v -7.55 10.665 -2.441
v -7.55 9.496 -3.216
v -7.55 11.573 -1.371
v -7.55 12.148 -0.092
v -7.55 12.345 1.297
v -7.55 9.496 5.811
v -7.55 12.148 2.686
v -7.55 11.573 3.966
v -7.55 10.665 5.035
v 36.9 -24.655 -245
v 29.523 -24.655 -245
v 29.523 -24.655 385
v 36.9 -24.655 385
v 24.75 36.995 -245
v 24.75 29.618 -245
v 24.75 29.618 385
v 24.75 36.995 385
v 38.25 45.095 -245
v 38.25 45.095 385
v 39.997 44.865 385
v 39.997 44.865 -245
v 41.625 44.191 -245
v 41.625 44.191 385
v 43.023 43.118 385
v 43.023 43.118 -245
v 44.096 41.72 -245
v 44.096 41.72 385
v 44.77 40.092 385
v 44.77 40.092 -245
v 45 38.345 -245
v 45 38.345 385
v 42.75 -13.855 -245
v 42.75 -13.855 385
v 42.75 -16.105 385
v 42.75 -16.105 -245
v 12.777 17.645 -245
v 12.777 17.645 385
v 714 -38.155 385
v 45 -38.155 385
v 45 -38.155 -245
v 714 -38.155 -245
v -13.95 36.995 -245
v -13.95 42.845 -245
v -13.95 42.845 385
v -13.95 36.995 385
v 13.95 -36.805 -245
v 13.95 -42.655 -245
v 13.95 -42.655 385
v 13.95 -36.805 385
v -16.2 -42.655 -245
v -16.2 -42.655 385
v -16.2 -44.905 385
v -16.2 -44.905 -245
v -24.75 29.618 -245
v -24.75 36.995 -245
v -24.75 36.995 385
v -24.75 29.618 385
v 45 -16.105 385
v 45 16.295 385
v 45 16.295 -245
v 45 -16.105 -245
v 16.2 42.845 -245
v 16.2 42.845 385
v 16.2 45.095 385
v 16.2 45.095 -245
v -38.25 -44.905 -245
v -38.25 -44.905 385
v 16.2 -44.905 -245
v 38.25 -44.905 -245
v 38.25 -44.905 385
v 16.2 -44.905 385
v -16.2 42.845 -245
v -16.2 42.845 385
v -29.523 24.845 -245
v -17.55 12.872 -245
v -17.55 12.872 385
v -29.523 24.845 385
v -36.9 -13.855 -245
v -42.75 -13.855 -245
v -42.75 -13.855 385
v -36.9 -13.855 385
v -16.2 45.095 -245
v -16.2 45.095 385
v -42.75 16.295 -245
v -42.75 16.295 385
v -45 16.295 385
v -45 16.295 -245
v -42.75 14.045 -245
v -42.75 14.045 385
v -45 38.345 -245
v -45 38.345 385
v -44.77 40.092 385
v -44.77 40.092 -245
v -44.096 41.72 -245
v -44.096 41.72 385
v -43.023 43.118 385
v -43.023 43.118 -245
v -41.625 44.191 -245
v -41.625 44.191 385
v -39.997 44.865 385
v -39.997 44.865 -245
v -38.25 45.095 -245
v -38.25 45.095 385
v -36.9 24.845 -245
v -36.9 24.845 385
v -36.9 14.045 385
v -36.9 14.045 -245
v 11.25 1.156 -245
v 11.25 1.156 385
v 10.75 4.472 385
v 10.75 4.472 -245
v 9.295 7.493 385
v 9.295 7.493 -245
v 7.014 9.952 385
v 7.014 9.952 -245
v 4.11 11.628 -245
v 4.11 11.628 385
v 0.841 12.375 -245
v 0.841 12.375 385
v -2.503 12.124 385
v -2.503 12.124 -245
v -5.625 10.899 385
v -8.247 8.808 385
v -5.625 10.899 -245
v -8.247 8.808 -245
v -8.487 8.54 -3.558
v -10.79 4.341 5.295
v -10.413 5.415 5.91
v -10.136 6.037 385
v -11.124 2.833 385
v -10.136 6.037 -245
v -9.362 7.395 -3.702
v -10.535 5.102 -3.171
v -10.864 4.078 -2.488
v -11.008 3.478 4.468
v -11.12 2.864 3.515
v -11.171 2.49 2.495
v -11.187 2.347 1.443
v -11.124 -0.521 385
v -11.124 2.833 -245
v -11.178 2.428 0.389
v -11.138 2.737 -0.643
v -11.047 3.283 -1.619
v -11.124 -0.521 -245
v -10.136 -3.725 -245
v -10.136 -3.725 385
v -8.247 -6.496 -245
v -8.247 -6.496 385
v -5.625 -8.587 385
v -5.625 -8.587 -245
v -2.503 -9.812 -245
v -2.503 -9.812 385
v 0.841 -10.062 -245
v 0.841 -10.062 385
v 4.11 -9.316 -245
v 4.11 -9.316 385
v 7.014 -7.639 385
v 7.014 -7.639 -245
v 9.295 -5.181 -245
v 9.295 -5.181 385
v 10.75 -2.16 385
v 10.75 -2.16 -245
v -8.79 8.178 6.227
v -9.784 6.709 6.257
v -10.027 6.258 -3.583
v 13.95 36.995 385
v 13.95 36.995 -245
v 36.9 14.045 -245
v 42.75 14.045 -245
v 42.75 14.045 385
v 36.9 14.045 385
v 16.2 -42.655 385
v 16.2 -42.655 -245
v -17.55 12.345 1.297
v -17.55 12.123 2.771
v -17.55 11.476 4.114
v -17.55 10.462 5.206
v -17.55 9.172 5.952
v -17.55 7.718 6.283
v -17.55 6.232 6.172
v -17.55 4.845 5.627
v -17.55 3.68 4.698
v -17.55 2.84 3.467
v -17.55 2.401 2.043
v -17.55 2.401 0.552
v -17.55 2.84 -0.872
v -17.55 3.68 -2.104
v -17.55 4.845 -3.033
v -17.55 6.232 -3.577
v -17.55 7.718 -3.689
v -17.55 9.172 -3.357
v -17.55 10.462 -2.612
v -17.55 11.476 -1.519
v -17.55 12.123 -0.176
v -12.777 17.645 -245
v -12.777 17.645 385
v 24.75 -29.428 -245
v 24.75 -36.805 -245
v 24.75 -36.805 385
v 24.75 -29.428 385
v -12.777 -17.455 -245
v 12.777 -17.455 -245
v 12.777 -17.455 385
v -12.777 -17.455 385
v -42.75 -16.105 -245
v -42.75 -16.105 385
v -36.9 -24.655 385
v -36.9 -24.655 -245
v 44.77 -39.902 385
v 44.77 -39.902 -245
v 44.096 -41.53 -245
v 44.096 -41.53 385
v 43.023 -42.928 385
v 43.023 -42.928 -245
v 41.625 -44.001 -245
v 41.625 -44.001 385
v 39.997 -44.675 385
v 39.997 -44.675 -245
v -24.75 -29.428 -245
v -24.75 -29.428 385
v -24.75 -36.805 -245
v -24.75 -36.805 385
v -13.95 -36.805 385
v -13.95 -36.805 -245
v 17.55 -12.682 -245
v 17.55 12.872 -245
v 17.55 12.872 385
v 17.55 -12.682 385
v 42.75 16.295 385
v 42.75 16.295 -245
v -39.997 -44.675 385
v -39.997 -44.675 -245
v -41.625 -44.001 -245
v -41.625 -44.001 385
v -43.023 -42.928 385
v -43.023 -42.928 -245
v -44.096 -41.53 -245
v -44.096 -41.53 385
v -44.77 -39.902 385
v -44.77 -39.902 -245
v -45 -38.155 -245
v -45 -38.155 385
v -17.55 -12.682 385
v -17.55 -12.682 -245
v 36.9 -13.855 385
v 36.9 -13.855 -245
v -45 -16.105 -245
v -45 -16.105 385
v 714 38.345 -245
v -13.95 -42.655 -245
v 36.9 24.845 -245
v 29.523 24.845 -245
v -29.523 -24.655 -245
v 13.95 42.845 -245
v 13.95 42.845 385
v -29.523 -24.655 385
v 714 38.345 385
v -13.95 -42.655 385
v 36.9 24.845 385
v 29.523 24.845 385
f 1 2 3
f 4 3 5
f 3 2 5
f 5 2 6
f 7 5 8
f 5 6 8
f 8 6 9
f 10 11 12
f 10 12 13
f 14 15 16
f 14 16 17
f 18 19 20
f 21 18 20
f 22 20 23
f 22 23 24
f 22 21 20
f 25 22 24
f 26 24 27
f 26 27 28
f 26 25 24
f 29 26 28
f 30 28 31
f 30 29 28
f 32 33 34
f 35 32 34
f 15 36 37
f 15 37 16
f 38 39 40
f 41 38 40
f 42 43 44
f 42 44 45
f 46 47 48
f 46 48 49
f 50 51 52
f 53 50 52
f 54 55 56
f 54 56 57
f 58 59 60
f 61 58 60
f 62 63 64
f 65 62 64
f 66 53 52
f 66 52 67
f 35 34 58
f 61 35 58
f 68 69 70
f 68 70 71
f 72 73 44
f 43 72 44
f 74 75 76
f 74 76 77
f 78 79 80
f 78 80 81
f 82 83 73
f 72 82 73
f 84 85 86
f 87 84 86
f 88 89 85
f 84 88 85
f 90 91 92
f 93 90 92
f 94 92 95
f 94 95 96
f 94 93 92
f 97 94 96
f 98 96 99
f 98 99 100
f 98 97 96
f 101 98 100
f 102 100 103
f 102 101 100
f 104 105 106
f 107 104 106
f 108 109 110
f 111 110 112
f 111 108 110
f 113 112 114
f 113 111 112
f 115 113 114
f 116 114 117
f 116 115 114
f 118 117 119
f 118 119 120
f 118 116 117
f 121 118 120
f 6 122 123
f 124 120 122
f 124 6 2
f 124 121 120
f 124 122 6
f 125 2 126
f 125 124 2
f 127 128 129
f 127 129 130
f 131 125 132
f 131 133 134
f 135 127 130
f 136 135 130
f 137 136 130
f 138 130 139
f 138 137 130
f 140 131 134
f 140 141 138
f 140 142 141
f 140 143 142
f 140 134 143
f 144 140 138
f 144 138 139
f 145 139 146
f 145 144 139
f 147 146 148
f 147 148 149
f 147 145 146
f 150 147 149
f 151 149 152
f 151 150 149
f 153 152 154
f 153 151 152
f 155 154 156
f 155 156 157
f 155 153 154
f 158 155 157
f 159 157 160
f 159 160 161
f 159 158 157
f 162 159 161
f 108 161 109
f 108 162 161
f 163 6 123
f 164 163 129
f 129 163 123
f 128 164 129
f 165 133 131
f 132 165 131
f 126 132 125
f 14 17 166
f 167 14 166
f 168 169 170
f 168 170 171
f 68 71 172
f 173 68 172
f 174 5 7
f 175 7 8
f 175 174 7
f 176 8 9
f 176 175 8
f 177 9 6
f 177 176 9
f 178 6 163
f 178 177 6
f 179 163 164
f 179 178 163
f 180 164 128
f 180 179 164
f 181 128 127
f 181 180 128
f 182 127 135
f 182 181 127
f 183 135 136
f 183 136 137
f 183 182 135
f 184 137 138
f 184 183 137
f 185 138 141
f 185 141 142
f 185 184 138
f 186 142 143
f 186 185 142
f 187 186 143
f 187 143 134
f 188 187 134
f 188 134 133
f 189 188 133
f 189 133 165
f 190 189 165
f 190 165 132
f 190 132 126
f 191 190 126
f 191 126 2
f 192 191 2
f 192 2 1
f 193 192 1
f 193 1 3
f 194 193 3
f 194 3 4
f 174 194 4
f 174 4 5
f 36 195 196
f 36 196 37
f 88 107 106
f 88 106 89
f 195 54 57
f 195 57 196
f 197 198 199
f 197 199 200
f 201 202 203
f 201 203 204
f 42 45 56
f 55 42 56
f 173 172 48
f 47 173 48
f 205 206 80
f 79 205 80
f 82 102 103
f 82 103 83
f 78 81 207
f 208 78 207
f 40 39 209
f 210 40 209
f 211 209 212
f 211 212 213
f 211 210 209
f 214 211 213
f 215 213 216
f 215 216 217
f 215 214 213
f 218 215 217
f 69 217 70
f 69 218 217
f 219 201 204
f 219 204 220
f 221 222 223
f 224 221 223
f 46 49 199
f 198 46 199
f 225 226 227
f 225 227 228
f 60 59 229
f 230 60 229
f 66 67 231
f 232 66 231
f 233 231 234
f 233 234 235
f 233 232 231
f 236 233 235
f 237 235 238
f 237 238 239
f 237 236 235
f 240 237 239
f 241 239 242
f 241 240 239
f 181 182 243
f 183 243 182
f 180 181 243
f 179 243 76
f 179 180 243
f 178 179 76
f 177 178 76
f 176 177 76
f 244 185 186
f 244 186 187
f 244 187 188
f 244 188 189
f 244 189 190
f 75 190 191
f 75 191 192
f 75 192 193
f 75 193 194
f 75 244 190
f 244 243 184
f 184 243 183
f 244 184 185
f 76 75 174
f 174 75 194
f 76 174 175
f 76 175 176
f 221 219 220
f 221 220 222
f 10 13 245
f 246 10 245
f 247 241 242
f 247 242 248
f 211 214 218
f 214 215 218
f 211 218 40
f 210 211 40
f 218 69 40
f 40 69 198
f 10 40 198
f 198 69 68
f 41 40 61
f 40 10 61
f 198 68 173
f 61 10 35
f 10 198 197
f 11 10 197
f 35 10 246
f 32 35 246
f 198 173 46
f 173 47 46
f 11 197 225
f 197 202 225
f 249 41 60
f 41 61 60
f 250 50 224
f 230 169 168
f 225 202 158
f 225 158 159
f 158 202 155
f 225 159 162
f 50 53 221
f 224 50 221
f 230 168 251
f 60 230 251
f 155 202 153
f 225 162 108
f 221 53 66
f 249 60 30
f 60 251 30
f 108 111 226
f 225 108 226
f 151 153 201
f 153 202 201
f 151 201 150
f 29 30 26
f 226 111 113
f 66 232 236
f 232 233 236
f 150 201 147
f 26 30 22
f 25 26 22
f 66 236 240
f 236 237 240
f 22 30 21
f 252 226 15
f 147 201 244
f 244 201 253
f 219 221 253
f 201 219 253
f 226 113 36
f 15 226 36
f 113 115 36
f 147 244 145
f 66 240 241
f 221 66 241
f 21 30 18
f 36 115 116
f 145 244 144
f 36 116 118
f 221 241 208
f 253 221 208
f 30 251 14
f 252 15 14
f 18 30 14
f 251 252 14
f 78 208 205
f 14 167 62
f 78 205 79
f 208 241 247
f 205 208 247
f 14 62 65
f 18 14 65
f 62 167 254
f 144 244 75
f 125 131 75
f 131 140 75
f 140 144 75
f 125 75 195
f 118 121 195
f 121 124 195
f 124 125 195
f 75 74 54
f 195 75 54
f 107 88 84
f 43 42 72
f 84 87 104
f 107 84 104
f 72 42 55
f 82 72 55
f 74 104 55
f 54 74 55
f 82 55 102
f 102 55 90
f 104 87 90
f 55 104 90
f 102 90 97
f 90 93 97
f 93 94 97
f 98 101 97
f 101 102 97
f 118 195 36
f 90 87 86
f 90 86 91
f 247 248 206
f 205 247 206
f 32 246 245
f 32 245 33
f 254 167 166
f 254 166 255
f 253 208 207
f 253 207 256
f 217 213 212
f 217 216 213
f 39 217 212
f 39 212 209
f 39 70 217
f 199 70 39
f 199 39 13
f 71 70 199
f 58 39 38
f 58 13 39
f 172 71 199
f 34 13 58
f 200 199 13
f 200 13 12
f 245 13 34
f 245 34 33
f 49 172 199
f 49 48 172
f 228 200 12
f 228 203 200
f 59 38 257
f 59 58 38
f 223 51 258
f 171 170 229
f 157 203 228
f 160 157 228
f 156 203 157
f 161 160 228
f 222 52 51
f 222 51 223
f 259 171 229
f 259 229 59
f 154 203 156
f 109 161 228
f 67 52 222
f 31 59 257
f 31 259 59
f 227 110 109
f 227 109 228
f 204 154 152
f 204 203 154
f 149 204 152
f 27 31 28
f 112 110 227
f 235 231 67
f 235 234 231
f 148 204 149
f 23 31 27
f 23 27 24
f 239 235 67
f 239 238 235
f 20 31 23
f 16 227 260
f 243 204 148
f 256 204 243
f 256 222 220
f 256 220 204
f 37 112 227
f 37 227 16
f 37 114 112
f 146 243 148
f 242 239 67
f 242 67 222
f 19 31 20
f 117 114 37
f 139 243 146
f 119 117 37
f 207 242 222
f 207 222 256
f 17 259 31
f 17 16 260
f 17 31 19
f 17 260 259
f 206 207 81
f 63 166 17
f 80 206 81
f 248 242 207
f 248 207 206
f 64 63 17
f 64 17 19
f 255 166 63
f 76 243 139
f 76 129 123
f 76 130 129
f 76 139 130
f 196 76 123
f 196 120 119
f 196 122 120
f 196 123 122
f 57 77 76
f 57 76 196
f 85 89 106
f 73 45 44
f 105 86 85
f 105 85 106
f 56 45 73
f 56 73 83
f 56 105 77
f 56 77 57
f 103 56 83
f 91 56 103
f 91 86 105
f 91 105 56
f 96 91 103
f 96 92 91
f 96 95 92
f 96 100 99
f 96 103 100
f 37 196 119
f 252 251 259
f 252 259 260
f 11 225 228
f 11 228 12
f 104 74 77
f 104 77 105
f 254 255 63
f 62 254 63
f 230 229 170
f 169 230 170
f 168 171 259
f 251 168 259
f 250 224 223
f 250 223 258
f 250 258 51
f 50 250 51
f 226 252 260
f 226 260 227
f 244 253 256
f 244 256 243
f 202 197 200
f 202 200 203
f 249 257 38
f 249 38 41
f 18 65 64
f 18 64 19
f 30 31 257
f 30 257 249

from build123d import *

# Parameters (mm, degrees)
SKETCH1_R           = 2.5
BOSS_EXTRUDE1_DEPTH = 140
SCALE_2_SCALE       = 3
SCALE_3_SCALE       = 6
SCALE_5_SCALE       = 2
SCALE_6_SCALE       = 0.25
SCALE_7_SCALE       = 0.125
SCALE_8_SCALE       = 0.25
SCALE_9_SCALE       = 4
SCALE_10_SCALE      = 4
OTHER_START         = -17.55
OTHER_1_OUTLINE_R   = 5
OTHER_1_DEPTH       = 10
SKETCH_11_W         = 630
SKETCH_11_H         = 76.5
EXTRUDE_1_DEPTH     = 669


# Read off the part's stored shape, not the designer's step: 孔1
with BuildPart() as part:
    # Sketch1 → Boss-Extrude1 (new body)
    with BuildSketch(Plane.XY):
        with BuildLine():
            Line((2.839339828, 3.9), (5.5, 6.560660172))
            Line((5.5, 6.560660172), (5.5, 8.2))
            Line((5.5, 8.2), (3.1, 8.2))
            Line((3.1, 8.2), (3.1, 9.5))
            Line((3.1, 9.5), (3.6, 9.5))
            Line((3.6, 9.5), (3.6, 10))
            Line((3.6, 10), (8.5, 10))
            ThreePointArc((8.5, 10), (9.560660172, 9.560660172), (10, 8.5))
            Line((10, 8.5), (10, 3.6))
            Line((10, 3.6), (9.5, 3.6))
            Line((9.5, 3.6), (9.5, 3.1))
            Line((9.5, 3.1), (8.2, 3.1))
            Line((8.2, 3.1), (8.2, 5.5))
            Line((8.2, 5.5), (6.560660172, 5.5))
            Line((6.560660172, 5.5), (3.9, 2.839339828))
            Line((3.9, 2.839339828), (3.9, -2.839339828))
            Line((3.9, -2.839339828), (6.560660172, -5.5))
            Line((6.560660172, -5.5), (8.2, -5.5))
            Line((8.2, -5.5), (8.2, -3.1))
            Line((8.2, -3.1), (9.5, -3.1))
            Line((9.5, -3.1), (9.5, -3.6))
            Line((9.5, -3.6), (10, -3.6))
            Line((10, -3.6), (10, -8.5))
            ThreePointArc((10, -8.5), (9.560660172, -9.560660172), (8.5, -10))
            Line((8.5, -10), (3.6, -10))
            Line((3.6, -10), (3.6, -9.5))
            Line((3.6, -9.5), (3.1, -9.5))
            Line((3.1, -9.5), (3.1, -8.2))
            Line((3.1, -8.2), (5.5, -8.2))
            Line((5.5, -8.2), (5.5, -6.560660172))
            Line((5.5, -6.560660172), (2.839339828, -3.9))
            Line((2.839339828, -3.9), (-2.839339828, -3.9))
            Line((-2.839339828, -3.9), (-5.5, -6.560660172))
            Line((-5.5, -6.560660172), (-5.5, -8.2))
            Line((-5.5, -8.2), (-3.1, -8.2))
            Line((-3.1, -8.2), (-3.1, -9.5))
            Line((-3.1, -9.5), (-3.6, -9.5))
            Line((-3.6, -9.5), (-3.6, -10))
            Line((-3.6, -10), (-8.5, -10))
            ThreePointArc((-8.5, -10), (-9.560660172, -9.560660172), (-10, -8.5))
            Line((-10, -8.5), (-10, -3.6))
            Line((-10, -3.6), (-9.5, -3.6))
            Line((-9.5, -3.6), (-9.5, -3.1))
            Line((-9.5, -3.1), (-8.2, -3.1))
            Line((-8.2, -3.1), (-8.2, -5.5))
            Line((-8.2, -5.5), (-6.560660172, -5.5))
            Line((-6.560660172, -5.5), (-3.9, -2.839339828))
            Line((-3.9, -2.839339828), (-3.9, 2.839339828))
            Line((-3.9, 2.839339828), (-6.560660172, 5.5))
            Line((-6.560660172, 5.5), (-8.2, 5.5))
            Line((-8.2, 5.5), (-8.2, 3.1))
            Line((-8.2, 3.1), (-9.5, 3.1))
            Line((-9.5, 3.1), (-9.5, 3.6))
            Line((-9.5, 3.6), (-10, 3.6))
            Line((-10, 3.6), (-10, 8.5))
            ThreePointArc((-10, 8.5), (-9.560660172, 9.560660172), (-8.5, 10))
            Line((-8.5, 10), (-3.6, 10))
            Line((-3.6, 10), (-3.6, 9.5))
            Line((-3.6, 9.5), (-3.1, 9.5))
            Line((-3.1, 9.5), (-3.1, 8.2))
            Line((-3.1, 8.2), (-5.5, 8.2))
            Line((-5.5, 8.2), (-5.5, 6.560660172))
            Line((-5.5, 6.560660172), (-2.839339828, 3.9))
            Line((-2.839339828, 3.9), (2.839339828, 3.9))
        make_face()
        with Locations((0, 0.235847297)):
            Circle(SKETCH1_R, mode=Mode.SUBTRACT)
    extrude(amount=BOSS_EXTRUDE1_DEPTH)


with BuildPart() as part_1:
    # 缩放比例2: scaled about (0, -0.027095247, 70)
    add(part.part.scale(SCALE_2_SCALE).moved(Location((0, 0.054190494, -140))))


with BuildPart() as part_2:
    # 缩放比例3: scaled about (0, -0.027095247, 70)
    add(part_1.part.scale(SCALE_3_SCALE).moved(Location((0, 0.135476235, -350))))


with BuildPart() as part_3:
    # 缩放比例5: scaled about (0, -0.027095249, 70)
    add(part_2.part.scale(SCALE_5_SCALE).moved(Location((0, 0.027095249, -70))))


with BuildPart() as part_4:
    # 缩放比例6: scaled about (0, -0.027095249, 70)
    add(part_3.part.scale(SCALE_6_SCALE).moved(Location((0, -0.020321437, 52.5))))


with BuildPart() as part_5:
    # 缩放比例7: scaled about (0, -0.027095249, 70)
    add(part_4.part.scale(SCALE_7_SCALE).moved(Location((0, -0.023708343, 61.25))))


with BuildPart() as part_6:
    # 缩放比例8: scaled about (0, -0.027095249, 70)
    add(part_5.part.scale(SCALE_8_SCALE).moved(Location((0, -0.020321437, 52.5))))


with BuildPart() as part_7:
    # 缩放比例9: scaled about (0, -0.027095249, 70)
    add(part_6.part.scale(SCALE_9_SCALE).moved(Location((0, 0.081285747, -210))))


with BuildPart() as part_8:
    # 缩放比例10: scaled about (0, -0.027095249, 70)
    add(part_7.part.scale(SCALE_10_SCALE).moved(Location((0, 0.081285747, -210))))

    # 孔1 outline → 孔1 (cut)
    with BuildSketch(Plane.YZ.offset(OTHER_START)):
        with Locations((7.344833538, 1.297306883)):
            Circle(OTHER_1_OUTLINE_R)
    extrude(amount=OTHER_1_DEPTH, mode=Mode.SUBTRACT)

    # 草图11 → 凸台-拉伸1 (add)
    with BuildSketch(Plane(origin=(45, 0, 0), x_dir=(0, 0, -1), z_dir=(1, 0, 0))):
        with Locations((-70, 0.094833365)):
            Rectangle(SKETCH_11_W, SKETCH_11_H)
    extrude(amount=EXTRUDE_1_DEPTH)


solid = part_8.part
